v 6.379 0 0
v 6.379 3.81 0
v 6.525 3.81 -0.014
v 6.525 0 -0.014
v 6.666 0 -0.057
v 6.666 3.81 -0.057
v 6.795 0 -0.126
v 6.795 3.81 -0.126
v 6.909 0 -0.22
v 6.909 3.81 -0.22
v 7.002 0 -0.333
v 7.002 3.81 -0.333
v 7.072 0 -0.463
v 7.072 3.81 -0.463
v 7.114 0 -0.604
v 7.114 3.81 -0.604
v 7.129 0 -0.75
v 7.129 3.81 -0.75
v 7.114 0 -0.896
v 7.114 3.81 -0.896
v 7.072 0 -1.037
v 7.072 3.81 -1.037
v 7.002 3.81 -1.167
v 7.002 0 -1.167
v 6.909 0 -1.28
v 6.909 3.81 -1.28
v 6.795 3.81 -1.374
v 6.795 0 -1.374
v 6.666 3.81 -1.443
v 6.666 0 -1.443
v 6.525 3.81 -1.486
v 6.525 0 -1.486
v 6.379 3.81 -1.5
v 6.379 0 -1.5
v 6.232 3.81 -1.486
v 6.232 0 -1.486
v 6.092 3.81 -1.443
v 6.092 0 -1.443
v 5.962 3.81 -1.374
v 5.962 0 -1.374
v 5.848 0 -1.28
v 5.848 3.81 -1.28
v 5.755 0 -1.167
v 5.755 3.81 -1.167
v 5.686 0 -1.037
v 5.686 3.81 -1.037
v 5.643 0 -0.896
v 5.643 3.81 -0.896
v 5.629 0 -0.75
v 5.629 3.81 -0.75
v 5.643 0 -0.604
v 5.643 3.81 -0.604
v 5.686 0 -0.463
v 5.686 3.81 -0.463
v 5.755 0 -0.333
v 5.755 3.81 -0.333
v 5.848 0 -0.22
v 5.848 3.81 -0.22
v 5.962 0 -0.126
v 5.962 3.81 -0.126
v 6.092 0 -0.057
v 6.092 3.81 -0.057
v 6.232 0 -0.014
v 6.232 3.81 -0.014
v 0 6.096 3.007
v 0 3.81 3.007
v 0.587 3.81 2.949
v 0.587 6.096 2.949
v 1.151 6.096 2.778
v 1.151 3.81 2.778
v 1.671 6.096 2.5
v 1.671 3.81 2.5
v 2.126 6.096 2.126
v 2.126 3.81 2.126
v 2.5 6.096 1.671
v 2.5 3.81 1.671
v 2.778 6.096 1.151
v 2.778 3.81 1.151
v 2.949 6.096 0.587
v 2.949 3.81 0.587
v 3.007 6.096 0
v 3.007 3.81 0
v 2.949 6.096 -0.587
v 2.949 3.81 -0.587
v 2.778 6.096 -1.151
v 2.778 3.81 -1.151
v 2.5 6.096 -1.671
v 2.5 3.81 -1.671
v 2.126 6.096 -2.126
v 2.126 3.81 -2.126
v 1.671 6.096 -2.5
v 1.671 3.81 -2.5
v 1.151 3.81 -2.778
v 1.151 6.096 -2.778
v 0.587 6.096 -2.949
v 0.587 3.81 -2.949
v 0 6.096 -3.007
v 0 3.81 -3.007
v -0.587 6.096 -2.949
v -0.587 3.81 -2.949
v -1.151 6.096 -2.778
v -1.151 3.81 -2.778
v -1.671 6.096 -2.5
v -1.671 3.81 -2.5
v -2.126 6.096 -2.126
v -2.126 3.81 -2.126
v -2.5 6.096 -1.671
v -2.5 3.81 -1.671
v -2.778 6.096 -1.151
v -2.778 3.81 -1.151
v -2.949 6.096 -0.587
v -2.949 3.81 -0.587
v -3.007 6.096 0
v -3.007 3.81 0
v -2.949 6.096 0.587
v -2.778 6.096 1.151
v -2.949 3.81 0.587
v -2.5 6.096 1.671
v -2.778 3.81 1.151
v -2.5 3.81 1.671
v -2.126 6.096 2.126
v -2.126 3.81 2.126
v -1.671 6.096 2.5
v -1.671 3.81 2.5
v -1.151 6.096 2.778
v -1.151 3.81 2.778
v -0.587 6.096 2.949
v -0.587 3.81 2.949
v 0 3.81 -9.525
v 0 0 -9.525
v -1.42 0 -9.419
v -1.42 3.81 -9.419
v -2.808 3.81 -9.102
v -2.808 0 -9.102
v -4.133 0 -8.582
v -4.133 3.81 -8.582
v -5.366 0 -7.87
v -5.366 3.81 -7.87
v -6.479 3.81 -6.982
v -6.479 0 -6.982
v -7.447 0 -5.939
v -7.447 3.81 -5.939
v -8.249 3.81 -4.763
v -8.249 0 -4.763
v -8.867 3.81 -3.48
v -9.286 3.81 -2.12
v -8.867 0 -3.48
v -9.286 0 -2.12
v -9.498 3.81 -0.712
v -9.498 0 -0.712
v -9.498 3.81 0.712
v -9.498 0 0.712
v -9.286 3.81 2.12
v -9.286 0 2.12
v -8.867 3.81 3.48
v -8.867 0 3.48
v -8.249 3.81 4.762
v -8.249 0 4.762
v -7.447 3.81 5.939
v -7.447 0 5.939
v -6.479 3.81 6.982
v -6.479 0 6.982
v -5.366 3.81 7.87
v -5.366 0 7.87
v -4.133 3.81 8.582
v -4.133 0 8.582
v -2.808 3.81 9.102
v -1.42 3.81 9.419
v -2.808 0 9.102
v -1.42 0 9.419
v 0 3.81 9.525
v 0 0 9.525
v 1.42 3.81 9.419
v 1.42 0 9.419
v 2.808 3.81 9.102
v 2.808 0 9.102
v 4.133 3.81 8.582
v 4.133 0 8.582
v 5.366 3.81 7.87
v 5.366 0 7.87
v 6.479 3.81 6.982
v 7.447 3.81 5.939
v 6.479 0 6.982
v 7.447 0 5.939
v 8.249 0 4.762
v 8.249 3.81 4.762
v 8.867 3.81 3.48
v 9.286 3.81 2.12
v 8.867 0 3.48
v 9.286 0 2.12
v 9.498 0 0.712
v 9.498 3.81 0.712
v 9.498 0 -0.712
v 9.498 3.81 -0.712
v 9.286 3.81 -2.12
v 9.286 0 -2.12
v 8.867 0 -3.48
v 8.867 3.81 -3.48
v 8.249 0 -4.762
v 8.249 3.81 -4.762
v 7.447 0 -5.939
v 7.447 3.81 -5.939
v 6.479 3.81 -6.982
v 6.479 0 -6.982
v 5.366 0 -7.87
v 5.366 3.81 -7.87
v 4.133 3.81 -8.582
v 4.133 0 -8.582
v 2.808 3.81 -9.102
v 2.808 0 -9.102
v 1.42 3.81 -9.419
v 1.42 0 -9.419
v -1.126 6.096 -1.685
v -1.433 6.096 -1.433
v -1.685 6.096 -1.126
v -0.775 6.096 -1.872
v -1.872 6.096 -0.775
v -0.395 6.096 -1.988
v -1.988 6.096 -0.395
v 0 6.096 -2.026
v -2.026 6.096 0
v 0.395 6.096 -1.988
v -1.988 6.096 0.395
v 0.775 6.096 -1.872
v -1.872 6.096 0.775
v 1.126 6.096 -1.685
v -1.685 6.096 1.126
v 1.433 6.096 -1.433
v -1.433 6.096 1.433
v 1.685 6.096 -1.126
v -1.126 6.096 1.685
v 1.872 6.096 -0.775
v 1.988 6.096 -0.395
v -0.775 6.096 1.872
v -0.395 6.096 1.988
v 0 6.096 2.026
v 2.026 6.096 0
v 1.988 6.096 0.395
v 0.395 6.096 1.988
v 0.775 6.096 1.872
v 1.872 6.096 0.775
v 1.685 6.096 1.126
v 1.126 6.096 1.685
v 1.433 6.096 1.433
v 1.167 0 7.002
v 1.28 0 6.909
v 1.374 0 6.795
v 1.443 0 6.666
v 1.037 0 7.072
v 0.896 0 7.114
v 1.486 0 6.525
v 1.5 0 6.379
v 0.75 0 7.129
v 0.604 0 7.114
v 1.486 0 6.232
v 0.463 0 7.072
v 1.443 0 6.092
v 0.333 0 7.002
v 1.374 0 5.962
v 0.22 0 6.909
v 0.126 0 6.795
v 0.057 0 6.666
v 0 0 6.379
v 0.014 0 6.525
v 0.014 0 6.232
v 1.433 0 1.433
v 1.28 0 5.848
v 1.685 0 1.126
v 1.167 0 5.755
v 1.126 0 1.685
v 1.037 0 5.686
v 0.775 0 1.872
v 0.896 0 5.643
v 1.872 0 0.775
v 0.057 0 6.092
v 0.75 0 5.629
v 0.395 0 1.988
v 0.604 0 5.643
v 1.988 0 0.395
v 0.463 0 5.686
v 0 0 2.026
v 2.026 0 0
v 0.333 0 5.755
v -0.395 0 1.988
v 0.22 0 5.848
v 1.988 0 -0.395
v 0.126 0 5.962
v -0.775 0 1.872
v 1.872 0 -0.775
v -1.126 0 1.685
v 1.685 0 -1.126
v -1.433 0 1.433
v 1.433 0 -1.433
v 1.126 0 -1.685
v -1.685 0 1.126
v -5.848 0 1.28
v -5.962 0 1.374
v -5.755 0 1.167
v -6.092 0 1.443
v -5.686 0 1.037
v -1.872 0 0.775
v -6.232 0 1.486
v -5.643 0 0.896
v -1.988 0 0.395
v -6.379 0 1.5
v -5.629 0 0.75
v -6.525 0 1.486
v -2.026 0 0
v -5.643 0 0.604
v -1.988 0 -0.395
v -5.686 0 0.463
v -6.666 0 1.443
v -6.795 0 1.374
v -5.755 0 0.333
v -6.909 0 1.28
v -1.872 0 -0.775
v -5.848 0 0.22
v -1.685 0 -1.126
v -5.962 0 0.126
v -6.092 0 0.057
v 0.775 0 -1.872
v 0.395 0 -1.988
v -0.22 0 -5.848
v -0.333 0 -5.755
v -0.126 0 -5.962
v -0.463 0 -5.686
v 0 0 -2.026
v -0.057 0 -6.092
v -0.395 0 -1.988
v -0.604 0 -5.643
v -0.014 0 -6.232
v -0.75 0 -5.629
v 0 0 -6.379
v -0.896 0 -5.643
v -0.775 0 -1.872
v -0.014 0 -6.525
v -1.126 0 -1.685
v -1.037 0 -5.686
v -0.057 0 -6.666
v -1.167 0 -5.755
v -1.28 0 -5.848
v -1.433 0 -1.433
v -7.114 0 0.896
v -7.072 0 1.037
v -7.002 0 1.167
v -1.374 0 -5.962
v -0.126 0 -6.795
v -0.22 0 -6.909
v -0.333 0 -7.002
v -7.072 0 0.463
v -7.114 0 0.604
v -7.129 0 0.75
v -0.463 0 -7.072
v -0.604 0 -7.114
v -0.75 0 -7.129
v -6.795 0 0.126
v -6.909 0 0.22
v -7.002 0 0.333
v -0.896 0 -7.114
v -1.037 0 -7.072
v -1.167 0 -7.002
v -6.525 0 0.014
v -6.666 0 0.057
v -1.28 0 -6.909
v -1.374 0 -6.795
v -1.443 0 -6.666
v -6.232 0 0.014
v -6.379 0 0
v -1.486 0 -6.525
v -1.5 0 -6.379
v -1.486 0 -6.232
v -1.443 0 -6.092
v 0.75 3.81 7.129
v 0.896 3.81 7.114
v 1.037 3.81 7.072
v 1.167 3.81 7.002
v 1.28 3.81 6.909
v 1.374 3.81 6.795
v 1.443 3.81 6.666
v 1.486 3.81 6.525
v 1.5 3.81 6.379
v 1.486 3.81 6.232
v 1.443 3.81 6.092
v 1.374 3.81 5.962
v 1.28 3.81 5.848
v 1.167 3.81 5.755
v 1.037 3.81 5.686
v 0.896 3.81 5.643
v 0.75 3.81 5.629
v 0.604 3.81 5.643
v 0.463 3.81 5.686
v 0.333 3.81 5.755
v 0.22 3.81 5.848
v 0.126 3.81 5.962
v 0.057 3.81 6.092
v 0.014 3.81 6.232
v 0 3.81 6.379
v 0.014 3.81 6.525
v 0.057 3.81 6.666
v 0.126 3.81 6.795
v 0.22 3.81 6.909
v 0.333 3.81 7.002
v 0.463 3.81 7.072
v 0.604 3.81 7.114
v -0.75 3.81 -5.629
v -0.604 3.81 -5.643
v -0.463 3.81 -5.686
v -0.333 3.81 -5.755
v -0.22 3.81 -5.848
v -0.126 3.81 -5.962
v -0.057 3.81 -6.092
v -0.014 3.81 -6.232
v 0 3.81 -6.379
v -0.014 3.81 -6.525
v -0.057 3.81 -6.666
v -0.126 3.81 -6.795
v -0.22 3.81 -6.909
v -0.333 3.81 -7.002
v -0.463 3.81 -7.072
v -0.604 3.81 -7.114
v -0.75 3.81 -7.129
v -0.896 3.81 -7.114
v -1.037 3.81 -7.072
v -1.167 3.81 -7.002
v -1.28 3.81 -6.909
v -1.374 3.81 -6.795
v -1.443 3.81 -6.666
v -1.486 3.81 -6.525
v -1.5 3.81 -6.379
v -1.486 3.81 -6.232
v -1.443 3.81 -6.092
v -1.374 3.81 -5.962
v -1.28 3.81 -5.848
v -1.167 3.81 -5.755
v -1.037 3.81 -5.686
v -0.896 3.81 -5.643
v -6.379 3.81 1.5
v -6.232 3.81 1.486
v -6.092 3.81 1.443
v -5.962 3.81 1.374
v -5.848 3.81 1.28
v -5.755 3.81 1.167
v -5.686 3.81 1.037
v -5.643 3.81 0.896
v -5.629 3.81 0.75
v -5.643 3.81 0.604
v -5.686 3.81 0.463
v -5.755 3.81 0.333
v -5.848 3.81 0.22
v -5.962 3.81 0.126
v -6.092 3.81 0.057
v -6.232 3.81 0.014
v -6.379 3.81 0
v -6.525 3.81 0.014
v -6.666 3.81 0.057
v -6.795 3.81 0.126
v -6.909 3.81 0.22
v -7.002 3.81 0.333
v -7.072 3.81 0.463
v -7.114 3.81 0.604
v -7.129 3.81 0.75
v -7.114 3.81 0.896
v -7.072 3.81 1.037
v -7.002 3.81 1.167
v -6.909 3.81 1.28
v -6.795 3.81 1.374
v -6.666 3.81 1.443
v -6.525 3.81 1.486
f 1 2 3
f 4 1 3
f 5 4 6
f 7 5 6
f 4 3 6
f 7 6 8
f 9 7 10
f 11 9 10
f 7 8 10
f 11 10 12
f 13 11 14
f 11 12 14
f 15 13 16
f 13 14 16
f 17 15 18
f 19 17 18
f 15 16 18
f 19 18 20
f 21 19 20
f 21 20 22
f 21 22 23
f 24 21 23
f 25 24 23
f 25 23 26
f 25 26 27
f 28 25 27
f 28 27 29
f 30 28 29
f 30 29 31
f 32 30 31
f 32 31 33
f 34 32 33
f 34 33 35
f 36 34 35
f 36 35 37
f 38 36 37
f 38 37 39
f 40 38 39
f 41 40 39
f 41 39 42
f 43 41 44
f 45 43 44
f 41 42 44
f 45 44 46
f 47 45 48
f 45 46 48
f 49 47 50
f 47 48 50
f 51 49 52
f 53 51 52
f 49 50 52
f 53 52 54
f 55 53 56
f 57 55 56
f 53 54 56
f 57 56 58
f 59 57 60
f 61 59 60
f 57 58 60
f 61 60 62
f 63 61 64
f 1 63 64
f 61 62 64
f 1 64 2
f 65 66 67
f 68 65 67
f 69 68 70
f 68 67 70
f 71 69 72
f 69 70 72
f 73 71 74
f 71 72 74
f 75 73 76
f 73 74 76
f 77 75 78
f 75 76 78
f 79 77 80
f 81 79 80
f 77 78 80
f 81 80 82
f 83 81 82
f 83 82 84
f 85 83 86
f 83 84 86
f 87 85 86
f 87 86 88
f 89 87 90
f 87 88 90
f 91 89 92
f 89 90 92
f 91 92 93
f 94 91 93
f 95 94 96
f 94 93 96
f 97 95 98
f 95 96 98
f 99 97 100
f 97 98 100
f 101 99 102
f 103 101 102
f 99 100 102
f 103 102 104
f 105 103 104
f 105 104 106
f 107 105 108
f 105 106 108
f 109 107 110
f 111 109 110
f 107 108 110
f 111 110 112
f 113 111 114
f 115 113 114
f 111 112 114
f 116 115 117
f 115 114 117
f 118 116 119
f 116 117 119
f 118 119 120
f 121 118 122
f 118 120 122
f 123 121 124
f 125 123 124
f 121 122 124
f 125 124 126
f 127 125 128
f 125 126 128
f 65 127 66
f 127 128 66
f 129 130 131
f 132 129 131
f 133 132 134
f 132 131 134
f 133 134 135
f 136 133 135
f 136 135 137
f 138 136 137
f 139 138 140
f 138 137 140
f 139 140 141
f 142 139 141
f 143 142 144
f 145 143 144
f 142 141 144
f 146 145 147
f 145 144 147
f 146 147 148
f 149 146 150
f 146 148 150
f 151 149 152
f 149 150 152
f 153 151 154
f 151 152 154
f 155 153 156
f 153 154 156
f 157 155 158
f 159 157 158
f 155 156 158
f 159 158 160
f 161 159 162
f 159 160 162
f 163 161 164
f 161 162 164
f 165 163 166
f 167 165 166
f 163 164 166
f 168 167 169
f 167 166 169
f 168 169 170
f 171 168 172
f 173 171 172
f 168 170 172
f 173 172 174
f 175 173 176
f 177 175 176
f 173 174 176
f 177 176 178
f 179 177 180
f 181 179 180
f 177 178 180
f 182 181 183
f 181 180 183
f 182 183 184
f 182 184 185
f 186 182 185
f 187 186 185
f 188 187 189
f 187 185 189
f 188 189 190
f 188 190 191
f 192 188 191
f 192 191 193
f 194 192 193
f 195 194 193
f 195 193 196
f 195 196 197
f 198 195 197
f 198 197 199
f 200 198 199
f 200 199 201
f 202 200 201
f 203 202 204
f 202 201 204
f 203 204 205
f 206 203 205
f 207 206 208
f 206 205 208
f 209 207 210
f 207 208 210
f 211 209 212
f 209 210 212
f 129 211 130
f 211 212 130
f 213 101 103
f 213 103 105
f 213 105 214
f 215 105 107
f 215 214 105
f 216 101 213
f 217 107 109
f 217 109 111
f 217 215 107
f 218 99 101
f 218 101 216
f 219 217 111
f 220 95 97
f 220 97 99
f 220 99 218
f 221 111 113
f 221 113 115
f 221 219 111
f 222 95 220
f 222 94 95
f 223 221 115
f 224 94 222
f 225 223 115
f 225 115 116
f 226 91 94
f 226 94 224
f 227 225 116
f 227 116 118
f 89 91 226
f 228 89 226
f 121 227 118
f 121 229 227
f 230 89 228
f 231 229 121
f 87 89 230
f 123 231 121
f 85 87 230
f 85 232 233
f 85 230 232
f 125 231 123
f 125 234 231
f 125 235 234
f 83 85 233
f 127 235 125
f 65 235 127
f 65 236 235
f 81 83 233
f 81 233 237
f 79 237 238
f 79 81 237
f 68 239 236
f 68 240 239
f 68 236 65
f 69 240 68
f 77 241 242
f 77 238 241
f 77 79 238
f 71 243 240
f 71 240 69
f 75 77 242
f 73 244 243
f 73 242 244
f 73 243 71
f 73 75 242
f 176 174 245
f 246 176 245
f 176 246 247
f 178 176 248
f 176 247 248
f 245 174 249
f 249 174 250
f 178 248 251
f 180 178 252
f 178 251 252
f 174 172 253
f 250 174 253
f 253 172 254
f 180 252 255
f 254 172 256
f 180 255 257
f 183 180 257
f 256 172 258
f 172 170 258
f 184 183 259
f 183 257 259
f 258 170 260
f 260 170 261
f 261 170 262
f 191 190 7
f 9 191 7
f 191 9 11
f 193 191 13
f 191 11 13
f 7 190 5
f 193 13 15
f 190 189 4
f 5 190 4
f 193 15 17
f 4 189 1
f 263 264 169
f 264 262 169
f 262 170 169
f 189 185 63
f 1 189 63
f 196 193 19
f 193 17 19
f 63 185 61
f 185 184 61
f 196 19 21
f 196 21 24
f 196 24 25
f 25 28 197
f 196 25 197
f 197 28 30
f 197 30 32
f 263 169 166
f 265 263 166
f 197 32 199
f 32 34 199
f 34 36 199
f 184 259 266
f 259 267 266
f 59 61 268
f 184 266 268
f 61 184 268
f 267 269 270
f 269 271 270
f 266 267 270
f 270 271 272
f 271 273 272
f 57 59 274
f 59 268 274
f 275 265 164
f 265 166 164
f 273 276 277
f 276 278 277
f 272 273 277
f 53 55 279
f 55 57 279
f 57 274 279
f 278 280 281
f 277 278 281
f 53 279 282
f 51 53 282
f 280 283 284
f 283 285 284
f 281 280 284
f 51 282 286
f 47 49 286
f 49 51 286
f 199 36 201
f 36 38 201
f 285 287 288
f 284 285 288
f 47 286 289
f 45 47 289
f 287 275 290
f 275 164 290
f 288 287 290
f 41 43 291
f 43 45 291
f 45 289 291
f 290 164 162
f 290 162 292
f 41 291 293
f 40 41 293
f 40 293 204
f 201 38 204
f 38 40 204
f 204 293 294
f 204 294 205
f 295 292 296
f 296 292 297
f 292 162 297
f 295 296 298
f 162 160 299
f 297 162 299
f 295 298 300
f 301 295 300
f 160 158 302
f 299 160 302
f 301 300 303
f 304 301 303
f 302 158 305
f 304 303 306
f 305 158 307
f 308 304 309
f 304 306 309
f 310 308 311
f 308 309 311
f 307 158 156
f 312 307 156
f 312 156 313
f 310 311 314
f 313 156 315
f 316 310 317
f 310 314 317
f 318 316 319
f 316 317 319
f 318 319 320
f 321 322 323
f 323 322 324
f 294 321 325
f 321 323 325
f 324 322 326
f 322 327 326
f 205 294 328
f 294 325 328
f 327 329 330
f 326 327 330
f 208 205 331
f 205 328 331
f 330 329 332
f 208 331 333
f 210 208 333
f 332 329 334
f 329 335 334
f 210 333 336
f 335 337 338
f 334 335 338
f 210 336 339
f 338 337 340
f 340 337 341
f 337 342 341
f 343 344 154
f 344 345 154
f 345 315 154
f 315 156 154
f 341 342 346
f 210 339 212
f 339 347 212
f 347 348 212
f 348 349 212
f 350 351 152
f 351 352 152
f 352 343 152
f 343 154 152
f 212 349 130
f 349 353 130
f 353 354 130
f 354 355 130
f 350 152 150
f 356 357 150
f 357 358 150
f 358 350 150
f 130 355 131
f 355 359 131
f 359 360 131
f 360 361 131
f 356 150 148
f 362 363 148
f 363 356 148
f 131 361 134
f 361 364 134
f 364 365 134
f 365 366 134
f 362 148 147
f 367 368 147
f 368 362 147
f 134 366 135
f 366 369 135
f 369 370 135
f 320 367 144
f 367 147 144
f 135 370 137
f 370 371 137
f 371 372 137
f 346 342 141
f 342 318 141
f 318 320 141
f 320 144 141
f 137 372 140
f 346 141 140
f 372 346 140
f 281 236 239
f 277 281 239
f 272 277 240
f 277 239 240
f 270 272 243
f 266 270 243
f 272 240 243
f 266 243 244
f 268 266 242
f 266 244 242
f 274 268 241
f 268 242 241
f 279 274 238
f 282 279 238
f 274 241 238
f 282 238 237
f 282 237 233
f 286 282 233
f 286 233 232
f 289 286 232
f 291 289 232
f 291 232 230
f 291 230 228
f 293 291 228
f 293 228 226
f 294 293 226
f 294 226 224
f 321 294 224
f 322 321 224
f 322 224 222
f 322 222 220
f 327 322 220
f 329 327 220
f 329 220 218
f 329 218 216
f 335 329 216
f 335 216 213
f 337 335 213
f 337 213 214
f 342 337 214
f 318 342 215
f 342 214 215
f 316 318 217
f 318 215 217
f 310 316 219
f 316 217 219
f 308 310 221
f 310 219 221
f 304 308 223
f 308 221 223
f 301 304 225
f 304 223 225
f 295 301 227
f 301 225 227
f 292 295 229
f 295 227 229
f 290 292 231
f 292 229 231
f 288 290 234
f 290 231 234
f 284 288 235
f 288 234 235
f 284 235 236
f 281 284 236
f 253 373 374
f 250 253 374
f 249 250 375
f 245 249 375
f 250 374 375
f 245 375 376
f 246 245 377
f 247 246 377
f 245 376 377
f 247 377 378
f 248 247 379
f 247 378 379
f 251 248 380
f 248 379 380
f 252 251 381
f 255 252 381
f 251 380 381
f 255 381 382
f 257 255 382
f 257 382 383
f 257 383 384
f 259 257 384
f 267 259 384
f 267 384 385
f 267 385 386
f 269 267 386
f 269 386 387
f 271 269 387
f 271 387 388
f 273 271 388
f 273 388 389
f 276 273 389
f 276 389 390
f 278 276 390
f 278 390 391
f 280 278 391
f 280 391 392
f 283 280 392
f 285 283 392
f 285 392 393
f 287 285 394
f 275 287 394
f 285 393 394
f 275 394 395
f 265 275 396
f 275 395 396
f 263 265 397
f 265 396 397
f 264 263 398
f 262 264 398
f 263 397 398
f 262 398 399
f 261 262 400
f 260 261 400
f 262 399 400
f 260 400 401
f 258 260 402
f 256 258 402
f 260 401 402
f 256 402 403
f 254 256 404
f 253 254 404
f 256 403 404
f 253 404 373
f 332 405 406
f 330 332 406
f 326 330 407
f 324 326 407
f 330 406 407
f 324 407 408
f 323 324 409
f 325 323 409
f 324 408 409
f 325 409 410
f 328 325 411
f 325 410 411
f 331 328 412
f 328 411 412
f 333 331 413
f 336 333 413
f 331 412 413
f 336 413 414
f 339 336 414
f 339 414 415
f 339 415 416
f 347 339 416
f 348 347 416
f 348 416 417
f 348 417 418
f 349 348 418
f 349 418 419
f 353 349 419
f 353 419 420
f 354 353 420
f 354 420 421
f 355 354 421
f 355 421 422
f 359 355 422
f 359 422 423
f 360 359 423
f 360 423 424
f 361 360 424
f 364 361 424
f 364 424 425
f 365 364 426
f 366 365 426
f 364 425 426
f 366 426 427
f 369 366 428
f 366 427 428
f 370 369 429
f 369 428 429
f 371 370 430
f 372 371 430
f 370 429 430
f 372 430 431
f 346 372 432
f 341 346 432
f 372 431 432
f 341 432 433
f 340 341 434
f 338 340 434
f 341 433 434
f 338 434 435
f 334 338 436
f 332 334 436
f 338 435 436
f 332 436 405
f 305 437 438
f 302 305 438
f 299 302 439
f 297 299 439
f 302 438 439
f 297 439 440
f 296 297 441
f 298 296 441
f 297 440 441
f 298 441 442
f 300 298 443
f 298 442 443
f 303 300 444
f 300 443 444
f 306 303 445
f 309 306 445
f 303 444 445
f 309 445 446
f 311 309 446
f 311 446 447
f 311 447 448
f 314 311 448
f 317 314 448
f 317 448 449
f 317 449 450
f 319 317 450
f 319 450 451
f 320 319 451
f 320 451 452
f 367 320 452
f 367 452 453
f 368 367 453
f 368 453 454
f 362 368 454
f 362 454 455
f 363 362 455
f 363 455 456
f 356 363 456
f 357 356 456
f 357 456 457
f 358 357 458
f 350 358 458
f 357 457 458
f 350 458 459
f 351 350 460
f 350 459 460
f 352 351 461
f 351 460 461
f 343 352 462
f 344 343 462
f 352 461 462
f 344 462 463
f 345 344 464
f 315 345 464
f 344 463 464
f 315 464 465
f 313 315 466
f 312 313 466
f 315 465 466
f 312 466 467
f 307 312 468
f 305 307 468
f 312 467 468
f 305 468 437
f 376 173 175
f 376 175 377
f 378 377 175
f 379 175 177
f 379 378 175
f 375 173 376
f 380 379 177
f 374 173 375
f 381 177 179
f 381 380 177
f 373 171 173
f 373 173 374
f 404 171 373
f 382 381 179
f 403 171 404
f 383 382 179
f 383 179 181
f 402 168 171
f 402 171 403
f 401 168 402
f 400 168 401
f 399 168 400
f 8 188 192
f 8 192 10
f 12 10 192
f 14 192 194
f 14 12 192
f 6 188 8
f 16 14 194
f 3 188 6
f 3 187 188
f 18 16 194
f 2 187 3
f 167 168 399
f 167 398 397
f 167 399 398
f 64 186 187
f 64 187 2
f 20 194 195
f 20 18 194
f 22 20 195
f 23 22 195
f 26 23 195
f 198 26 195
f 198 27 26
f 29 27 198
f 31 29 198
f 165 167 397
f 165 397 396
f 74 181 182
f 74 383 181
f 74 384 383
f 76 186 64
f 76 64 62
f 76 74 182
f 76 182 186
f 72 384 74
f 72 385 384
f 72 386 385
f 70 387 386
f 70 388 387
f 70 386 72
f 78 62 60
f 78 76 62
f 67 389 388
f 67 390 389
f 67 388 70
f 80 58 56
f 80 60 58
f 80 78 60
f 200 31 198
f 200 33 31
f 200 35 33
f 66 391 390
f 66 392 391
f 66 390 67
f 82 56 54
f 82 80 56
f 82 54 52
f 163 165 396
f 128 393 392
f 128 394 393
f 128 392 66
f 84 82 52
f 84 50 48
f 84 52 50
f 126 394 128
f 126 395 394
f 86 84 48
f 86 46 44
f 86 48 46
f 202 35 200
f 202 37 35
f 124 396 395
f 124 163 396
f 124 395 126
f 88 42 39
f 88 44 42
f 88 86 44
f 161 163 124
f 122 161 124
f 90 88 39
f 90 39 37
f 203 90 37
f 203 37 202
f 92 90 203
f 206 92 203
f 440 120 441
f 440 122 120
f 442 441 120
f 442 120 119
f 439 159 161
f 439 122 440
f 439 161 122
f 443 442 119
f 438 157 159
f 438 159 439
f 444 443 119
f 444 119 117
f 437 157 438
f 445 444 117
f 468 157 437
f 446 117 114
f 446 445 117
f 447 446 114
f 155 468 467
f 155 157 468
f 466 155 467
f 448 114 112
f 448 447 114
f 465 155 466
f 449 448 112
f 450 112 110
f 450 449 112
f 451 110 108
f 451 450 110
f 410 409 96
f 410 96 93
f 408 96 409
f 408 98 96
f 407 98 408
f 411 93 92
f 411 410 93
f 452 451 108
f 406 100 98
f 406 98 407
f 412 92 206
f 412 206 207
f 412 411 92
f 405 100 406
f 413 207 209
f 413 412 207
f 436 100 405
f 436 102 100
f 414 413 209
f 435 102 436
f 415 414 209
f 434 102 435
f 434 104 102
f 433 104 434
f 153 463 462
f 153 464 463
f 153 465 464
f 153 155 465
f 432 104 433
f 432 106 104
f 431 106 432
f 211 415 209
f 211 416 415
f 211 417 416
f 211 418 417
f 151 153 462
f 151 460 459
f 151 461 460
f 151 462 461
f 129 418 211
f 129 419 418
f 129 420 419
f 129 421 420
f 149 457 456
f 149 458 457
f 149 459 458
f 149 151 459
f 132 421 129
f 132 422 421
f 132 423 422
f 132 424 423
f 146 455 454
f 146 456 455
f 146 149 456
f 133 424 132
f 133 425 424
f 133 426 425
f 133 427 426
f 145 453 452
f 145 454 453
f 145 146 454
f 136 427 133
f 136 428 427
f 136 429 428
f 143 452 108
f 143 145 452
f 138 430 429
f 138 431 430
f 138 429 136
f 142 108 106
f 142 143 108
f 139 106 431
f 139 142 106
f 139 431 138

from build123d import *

# Parameters (mm, degrees)
SKETCH1_R           = 9.525
BOSS_EXTRUDE1_DEPTH = 3.81
SKETCH2_R           = 3.006995321
BOSS_EXTRUDE2_DEPTH = 2.286
SKETCH3_R           = 0.749981853
CUT_EXTRUDE1_DEPTH  = 12.446
SKETCH4_R           = 2.02646881
CUT_EXTRUDE2_DEPTH  = 12.446


with BuildPart() as part:
    # Sketch1 → Boss-Extrude1 (new body)
    with BuildSketch(Plane(origin=(0, 0, 0), x_dir=(1, 0, 0), z_dir=(0, 1, 0))):
        with Locations(Location((0, 0, 0), (0, 0, 90))):
            Circle(SKETCH1_R)
    extrude(amount=BOSS_EXTRUDE1_DEPTH)

    # Sketch2 → Boss-Extrude2 (add)
    with BuildSketch(Plane(origin=(0, 3.81, 0), x_dir=(1, 0, 0), z_dir=(0, 1, 0))):
        with Locations(Location((0, 0, 0), (0, 0, 270))):
            Circle(SKETCH2_R)
    extrude(amount=BOSS_EXTRUDE2_DEPTH)

    # Sketch3 → Cut-Extrude1 (cut)
    with BuildSketch(Plane(origin=(0, 3.81, 0), x_dir=(1, 0, 0), z_dir=(0, 1, 0))):
        with Locations(Location((-0.749981853, 6.378803081, 0), (0, 0, 270))):
            Circle(SKETCH3_R)
        with Locations(Location((6.378803081, 0.749981853, 0), (0, 0, 270))):
            Circle(SKETCH3_R)
        with Locations(Location((0.749981853, -6.378803081, 0), (0, 0, 270))):
            Circle(SKETCH3_R)
        with Locations(Location((-6.378803081, -0.749981853, 0), (0, 0, 270))):
            Circle(SKETCH3_R)
    extrude(amount=-CUT_EXTRUDE1_DEPTH, mode=Mode.SUBTRACT)

    # Sketch4 → Cut-Extrude2 (cut)
    with BuildSketch(Plane(origin=(0, 6.096, 0), x_dir=(1, 0, 0), z_dir=(0, 1, 0))):
        with Locations(Location((0, 0, 0), (0, 0, 270))):
            Circle(SKETCH4_R)
    extrude(amount=-CUT_EXTRUDE2_DEPTH, mode=Mode.SUBTRACT)


solid = part.part
